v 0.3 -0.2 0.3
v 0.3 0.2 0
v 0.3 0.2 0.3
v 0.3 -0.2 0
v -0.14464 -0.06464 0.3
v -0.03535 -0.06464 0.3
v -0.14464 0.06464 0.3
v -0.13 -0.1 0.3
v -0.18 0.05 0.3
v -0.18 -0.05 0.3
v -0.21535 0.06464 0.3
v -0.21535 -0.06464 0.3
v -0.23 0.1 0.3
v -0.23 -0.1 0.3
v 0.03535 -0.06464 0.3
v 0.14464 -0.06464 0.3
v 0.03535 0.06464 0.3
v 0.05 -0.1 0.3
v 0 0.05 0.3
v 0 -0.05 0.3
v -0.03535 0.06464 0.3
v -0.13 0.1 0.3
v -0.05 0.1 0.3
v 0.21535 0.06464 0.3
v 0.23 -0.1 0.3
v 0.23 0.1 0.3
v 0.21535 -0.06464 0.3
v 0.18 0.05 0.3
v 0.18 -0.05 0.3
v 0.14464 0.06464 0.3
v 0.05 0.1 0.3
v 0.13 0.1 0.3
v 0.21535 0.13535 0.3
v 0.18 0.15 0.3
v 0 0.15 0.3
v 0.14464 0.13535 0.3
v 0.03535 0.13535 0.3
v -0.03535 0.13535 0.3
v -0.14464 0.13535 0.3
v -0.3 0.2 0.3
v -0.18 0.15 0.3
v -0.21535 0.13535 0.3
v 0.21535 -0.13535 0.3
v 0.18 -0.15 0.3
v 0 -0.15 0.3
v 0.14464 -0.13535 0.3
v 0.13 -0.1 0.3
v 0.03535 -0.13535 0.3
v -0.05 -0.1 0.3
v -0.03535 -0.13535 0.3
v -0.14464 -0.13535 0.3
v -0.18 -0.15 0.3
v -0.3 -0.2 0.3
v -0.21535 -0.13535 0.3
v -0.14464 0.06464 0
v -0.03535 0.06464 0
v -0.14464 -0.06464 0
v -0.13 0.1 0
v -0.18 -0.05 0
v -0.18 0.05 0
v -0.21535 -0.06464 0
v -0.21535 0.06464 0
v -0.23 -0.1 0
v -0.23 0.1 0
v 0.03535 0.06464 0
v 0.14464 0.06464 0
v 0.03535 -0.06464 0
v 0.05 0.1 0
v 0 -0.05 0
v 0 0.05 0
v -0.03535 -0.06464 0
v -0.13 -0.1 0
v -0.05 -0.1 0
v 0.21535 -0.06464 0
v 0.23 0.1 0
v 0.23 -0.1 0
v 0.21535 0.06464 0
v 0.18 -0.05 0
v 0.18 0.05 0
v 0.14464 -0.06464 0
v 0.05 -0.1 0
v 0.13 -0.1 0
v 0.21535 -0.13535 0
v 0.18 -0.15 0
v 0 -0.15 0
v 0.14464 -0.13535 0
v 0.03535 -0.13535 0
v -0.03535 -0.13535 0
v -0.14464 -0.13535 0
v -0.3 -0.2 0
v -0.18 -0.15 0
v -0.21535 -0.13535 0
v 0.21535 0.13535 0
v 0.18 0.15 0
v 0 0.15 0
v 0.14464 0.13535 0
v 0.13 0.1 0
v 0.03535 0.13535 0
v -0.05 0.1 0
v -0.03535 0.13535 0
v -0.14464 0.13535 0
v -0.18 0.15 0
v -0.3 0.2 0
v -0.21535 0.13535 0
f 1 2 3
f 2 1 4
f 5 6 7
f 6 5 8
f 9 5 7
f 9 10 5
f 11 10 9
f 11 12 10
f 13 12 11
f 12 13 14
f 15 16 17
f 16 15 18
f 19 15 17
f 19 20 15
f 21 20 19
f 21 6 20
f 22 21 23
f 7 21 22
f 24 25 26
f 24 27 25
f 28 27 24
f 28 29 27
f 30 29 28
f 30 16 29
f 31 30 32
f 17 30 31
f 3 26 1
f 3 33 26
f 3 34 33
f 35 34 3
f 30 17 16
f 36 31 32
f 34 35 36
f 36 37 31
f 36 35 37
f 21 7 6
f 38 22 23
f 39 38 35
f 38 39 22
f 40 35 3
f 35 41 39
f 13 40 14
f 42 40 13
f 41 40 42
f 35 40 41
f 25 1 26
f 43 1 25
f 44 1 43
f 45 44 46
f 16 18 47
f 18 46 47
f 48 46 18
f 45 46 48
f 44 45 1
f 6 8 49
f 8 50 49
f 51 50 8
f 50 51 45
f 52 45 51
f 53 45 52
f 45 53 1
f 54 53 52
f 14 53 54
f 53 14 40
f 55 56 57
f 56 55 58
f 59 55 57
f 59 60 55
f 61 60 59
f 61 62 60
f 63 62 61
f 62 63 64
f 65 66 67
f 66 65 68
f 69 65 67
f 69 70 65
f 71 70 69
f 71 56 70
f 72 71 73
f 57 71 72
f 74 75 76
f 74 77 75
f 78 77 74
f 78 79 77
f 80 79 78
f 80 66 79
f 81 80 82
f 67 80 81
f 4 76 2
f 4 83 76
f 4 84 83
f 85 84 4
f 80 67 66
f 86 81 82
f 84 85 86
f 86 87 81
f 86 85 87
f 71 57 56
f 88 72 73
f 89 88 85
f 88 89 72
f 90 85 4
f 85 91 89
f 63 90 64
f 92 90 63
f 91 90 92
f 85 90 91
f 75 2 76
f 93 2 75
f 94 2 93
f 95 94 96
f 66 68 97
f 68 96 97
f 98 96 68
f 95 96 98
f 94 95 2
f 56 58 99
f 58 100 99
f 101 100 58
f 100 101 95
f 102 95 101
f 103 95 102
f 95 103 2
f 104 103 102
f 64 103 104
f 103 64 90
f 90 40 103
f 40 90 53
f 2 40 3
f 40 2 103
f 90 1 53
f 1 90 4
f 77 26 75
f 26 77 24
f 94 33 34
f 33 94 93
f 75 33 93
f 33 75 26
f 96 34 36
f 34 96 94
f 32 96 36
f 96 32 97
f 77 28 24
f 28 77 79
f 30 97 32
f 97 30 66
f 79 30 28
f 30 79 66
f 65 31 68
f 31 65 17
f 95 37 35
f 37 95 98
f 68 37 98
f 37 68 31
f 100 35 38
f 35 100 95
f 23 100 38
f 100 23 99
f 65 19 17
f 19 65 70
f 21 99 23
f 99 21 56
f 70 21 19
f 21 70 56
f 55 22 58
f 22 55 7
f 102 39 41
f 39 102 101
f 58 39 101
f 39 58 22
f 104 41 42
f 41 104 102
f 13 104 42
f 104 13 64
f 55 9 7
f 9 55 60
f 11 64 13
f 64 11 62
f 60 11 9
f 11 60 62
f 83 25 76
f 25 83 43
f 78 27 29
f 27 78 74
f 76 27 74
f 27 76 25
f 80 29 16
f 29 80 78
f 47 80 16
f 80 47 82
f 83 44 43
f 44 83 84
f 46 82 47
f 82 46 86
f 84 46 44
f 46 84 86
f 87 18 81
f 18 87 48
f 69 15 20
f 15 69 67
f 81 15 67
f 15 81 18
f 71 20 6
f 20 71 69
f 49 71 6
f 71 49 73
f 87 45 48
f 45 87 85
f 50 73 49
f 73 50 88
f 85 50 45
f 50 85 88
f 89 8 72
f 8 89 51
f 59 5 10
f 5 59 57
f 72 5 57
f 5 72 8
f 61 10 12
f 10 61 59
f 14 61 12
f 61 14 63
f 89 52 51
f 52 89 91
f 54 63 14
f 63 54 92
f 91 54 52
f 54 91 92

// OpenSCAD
// file: lib.scad
function x(v) = v[0];
function y(v) = v[1];
function z(v) = v[2];
function add(v1,v2) = [ for (i = [ 0 : len(v1)-1 ]) v1[i] + v2[i] ];
function xv(d) = [d,0,0];
function yv(d) = [0,d,0];
function zv(d) = [0,0,d];

module box(v) { cube(size=v, center=true); }
module cyl(r1,r2,h) { cylinder(r1=r1, r2=r2, h=h, center=true); }

function grow(n,v) = [x(v)+n*2, y(v)+n*2, z(v)+n*2];

module rbox(v, radius=1) {
	cx = x(v)/2-radius;
	cy = y(v)/2-radius;
	cz = z(v)/2-radius;

	hull() {
		translate([cx,cy,cz]) sphere(r=radius);
		translate([cx,cy,-cz]) sphere(r=radius);
		translate([cx,-cy,cz]) sphere(r=radius);
		translate([cx,-cy,-cz]) sphere(r=radius);
		translate([-cx,cy,cz]) sphere(r=radius);
		translate([-cx,cy,-cz]) sphere(r=radius);
		translate([-cx,-cy,cz]) sphere(r=radius);
		translate([-cx,-cy,-cz]) sphere(r=radius);
	}
}

module fillet(r=1) {
  minkowski() {
    difference() {
      children();
      minkowski() {
        difference() {
          minkowski() {
            children();
            sphere(r=r);
          }
          children();
        }
        sphere(r=r);
      }
    }
    sphere(r=r);
  }
}
// main file
use <lib.scad>

module body() {
	translate([0,0,0.15]) difference() {
		if ($fn > 8) rbox([0.6, 0.4, 0.3], 0.01, $fn=round($fn/8)); else box([0.6, 0.4, 0.3]);
		#translate([0.18,0.1,0]) cyl(0.05, 0.05, 1.0);
		#translate([0.0,0.1,0]) cyl(0.05, 0.05, 1.0);
		#translate([-0.18,0.1,0]) cyl(0.05, 0.05, 1.0);
		#translate([0.18,-0.1,0]) cyl(0.05, 0.05, 1.0);
		#translate([0.0,-0.1,0]) cyl(0.05, 0.05, 1.0);
		#translate([-0.18,-0.1,0]) cyl(0.05, 0.05, 1.0);
	}
}

d = 8;
body($fn=d);
